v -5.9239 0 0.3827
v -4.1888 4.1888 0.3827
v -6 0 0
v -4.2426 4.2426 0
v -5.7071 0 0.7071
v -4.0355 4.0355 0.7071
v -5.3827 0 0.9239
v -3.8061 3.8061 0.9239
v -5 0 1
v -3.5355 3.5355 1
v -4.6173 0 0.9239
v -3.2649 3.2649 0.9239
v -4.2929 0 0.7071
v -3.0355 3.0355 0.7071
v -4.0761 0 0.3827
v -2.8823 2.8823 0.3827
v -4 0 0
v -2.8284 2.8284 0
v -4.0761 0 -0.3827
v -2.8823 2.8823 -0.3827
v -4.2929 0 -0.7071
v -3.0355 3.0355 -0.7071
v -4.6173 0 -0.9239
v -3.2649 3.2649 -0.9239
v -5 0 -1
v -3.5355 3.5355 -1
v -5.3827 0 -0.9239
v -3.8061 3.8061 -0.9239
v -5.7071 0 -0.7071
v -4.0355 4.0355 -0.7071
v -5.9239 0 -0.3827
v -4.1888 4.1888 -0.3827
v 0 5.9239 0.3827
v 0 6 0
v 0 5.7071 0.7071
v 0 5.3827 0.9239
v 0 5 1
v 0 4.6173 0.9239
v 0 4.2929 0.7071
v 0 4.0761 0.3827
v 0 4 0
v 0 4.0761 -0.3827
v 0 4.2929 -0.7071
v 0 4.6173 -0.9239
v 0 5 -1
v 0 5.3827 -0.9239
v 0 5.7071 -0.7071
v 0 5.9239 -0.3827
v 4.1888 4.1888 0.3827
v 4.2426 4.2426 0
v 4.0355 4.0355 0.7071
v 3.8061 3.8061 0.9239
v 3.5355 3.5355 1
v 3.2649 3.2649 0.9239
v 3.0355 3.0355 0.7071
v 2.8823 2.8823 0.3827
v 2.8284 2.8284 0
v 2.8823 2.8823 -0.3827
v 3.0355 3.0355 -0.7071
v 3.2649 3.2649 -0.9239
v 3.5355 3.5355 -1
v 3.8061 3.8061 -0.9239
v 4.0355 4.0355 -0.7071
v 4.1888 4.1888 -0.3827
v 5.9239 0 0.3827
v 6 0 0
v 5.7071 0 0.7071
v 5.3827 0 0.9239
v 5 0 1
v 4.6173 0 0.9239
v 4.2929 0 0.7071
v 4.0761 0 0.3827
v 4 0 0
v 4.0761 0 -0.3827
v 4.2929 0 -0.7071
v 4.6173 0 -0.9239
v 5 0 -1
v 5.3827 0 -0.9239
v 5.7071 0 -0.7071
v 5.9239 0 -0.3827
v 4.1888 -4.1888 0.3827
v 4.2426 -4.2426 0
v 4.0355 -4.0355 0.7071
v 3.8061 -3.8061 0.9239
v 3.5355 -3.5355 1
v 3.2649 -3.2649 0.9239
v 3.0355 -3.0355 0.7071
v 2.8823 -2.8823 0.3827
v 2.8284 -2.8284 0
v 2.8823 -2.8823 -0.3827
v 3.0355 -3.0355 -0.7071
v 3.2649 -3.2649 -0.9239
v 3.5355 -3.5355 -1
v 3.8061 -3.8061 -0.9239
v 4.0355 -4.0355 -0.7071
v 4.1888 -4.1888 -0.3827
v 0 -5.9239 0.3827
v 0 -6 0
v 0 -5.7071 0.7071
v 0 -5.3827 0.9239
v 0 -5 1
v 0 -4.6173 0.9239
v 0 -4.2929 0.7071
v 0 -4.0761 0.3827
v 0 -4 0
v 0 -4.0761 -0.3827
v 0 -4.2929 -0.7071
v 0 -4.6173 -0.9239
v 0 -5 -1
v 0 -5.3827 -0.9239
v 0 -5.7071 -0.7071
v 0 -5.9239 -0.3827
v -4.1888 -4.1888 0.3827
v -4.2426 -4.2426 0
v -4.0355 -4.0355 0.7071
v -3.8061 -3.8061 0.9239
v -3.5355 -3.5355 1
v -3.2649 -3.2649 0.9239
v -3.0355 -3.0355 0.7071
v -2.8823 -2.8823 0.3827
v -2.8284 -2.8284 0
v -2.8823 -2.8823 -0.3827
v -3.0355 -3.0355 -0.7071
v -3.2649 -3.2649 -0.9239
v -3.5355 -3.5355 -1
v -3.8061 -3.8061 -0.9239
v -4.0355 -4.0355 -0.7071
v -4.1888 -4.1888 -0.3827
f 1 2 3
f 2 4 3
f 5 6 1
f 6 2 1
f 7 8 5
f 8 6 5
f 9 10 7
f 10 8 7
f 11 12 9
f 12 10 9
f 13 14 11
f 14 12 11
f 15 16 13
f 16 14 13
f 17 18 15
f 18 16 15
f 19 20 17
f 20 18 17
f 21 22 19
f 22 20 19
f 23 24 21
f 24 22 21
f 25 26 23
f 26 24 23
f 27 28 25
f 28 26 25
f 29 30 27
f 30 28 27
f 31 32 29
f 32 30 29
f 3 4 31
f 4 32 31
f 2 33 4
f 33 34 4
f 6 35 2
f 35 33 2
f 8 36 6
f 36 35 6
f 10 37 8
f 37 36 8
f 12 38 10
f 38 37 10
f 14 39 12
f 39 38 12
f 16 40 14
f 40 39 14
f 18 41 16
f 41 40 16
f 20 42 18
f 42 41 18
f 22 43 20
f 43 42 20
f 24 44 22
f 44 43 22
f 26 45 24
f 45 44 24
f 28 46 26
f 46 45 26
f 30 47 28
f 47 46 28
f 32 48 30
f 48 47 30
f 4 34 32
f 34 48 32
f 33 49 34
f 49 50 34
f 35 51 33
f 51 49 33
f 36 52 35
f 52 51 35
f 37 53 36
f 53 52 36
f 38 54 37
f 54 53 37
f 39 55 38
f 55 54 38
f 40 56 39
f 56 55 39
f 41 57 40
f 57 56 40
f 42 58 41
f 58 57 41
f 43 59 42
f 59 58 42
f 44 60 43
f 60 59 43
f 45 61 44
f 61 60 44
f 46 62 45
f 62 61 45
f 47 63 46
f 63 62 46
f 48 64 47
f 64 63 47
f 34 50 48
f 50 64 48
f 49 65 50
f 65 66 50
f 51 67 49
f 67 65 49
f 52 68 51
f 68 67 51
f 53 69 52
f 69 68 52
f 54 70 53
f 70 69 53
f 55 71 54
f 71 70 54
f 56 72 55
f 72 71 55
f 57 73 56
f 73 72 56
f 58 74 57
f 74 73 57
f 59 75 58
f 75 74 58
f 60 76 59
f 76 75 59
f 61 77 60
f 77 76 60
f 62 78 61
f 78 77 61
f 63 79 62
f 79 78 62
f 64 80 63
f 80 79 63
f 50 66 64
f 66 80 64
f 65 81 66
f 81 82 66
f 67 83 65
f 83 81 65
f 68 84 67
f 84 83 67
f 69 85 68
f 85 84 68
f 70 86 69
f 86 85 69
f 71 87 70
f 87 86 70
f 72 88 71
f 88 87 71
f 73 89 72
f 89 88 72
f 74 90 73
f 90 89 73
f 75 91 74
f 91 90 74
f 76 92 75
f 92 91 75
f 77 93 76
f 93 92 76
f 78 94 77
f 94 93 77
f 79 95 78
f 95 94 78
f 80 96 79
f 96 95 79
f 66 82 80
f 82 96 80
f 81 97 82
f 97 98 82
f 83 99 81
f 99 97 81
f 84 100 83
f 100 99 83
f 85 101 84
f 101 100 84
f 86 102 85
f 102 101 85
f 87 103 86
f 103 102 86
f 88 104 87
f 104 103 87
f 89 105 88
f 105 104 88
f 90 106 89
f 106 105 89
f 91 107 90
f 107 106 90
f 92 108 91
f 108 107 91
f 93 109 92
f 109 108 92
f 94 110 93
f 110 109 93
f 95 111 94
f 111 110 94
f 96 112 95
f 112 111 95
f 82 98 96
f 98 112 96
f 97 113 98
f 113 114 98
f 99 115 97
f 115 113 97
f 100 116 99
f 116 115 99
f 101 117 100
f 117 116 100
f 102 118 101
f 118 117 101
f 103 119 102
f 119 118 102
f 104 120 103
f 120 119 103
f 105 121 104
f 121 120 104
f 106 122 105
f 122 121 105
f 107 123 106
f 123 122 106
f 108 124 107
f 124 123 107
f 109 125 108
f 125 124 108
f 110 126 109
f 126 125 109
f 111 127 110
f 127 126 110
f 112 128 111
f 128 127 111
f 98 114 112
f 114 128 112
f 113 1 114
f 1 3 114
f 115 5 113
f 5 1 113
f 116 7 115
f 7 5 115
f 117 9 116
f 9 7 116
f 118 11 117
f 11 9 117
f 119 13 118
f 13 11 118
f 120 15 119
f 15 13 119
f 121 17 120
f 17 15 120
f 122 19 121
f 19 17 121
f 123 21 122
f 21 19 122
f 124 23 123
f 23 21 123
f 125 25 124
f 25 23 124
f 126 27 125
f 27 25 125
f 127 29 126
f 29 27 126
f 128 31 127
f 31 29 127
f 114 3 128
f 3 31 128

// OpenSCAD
// Sets the pahses of the torus (only for round mode)
faces_of_round_shape = 16;
// Height of the cylinder version in mm
height = 5;
// Defines the roundness of the shape
sides_of_roundness = 8;
cylinder_or_round = "round";//[round,cylinder]
// Thickness of the wall in mm
thickness = 1;
// Diameter ofthe hole in mm
diameter = 4;
if (cylinder_or_round == "round") {
  // torus
  rotate_extrude($fn=sides_of_roundness) {
    translate([(diameter + thickness), 0, 0]) {
      circle(r=thickness, $fn=faces_of_round_shape);
    }
  }
} else {
  difference() {
    linear_extrude( height=height, twist=0, scale=[1, 1], center=false){
      {
        $fn=sides_of_roundness;    //set sides to sides_of_roundness
        circle(r=(diameter + thickness));
      }
    }

    linear_extrude( height=height, twist=0, scale=[1, 1], center=false){
      {
        $fn=sides_of_roundness;    //set sides to sides_of_roundness
        circle(r=diameter);
      }
    }
  }
}
